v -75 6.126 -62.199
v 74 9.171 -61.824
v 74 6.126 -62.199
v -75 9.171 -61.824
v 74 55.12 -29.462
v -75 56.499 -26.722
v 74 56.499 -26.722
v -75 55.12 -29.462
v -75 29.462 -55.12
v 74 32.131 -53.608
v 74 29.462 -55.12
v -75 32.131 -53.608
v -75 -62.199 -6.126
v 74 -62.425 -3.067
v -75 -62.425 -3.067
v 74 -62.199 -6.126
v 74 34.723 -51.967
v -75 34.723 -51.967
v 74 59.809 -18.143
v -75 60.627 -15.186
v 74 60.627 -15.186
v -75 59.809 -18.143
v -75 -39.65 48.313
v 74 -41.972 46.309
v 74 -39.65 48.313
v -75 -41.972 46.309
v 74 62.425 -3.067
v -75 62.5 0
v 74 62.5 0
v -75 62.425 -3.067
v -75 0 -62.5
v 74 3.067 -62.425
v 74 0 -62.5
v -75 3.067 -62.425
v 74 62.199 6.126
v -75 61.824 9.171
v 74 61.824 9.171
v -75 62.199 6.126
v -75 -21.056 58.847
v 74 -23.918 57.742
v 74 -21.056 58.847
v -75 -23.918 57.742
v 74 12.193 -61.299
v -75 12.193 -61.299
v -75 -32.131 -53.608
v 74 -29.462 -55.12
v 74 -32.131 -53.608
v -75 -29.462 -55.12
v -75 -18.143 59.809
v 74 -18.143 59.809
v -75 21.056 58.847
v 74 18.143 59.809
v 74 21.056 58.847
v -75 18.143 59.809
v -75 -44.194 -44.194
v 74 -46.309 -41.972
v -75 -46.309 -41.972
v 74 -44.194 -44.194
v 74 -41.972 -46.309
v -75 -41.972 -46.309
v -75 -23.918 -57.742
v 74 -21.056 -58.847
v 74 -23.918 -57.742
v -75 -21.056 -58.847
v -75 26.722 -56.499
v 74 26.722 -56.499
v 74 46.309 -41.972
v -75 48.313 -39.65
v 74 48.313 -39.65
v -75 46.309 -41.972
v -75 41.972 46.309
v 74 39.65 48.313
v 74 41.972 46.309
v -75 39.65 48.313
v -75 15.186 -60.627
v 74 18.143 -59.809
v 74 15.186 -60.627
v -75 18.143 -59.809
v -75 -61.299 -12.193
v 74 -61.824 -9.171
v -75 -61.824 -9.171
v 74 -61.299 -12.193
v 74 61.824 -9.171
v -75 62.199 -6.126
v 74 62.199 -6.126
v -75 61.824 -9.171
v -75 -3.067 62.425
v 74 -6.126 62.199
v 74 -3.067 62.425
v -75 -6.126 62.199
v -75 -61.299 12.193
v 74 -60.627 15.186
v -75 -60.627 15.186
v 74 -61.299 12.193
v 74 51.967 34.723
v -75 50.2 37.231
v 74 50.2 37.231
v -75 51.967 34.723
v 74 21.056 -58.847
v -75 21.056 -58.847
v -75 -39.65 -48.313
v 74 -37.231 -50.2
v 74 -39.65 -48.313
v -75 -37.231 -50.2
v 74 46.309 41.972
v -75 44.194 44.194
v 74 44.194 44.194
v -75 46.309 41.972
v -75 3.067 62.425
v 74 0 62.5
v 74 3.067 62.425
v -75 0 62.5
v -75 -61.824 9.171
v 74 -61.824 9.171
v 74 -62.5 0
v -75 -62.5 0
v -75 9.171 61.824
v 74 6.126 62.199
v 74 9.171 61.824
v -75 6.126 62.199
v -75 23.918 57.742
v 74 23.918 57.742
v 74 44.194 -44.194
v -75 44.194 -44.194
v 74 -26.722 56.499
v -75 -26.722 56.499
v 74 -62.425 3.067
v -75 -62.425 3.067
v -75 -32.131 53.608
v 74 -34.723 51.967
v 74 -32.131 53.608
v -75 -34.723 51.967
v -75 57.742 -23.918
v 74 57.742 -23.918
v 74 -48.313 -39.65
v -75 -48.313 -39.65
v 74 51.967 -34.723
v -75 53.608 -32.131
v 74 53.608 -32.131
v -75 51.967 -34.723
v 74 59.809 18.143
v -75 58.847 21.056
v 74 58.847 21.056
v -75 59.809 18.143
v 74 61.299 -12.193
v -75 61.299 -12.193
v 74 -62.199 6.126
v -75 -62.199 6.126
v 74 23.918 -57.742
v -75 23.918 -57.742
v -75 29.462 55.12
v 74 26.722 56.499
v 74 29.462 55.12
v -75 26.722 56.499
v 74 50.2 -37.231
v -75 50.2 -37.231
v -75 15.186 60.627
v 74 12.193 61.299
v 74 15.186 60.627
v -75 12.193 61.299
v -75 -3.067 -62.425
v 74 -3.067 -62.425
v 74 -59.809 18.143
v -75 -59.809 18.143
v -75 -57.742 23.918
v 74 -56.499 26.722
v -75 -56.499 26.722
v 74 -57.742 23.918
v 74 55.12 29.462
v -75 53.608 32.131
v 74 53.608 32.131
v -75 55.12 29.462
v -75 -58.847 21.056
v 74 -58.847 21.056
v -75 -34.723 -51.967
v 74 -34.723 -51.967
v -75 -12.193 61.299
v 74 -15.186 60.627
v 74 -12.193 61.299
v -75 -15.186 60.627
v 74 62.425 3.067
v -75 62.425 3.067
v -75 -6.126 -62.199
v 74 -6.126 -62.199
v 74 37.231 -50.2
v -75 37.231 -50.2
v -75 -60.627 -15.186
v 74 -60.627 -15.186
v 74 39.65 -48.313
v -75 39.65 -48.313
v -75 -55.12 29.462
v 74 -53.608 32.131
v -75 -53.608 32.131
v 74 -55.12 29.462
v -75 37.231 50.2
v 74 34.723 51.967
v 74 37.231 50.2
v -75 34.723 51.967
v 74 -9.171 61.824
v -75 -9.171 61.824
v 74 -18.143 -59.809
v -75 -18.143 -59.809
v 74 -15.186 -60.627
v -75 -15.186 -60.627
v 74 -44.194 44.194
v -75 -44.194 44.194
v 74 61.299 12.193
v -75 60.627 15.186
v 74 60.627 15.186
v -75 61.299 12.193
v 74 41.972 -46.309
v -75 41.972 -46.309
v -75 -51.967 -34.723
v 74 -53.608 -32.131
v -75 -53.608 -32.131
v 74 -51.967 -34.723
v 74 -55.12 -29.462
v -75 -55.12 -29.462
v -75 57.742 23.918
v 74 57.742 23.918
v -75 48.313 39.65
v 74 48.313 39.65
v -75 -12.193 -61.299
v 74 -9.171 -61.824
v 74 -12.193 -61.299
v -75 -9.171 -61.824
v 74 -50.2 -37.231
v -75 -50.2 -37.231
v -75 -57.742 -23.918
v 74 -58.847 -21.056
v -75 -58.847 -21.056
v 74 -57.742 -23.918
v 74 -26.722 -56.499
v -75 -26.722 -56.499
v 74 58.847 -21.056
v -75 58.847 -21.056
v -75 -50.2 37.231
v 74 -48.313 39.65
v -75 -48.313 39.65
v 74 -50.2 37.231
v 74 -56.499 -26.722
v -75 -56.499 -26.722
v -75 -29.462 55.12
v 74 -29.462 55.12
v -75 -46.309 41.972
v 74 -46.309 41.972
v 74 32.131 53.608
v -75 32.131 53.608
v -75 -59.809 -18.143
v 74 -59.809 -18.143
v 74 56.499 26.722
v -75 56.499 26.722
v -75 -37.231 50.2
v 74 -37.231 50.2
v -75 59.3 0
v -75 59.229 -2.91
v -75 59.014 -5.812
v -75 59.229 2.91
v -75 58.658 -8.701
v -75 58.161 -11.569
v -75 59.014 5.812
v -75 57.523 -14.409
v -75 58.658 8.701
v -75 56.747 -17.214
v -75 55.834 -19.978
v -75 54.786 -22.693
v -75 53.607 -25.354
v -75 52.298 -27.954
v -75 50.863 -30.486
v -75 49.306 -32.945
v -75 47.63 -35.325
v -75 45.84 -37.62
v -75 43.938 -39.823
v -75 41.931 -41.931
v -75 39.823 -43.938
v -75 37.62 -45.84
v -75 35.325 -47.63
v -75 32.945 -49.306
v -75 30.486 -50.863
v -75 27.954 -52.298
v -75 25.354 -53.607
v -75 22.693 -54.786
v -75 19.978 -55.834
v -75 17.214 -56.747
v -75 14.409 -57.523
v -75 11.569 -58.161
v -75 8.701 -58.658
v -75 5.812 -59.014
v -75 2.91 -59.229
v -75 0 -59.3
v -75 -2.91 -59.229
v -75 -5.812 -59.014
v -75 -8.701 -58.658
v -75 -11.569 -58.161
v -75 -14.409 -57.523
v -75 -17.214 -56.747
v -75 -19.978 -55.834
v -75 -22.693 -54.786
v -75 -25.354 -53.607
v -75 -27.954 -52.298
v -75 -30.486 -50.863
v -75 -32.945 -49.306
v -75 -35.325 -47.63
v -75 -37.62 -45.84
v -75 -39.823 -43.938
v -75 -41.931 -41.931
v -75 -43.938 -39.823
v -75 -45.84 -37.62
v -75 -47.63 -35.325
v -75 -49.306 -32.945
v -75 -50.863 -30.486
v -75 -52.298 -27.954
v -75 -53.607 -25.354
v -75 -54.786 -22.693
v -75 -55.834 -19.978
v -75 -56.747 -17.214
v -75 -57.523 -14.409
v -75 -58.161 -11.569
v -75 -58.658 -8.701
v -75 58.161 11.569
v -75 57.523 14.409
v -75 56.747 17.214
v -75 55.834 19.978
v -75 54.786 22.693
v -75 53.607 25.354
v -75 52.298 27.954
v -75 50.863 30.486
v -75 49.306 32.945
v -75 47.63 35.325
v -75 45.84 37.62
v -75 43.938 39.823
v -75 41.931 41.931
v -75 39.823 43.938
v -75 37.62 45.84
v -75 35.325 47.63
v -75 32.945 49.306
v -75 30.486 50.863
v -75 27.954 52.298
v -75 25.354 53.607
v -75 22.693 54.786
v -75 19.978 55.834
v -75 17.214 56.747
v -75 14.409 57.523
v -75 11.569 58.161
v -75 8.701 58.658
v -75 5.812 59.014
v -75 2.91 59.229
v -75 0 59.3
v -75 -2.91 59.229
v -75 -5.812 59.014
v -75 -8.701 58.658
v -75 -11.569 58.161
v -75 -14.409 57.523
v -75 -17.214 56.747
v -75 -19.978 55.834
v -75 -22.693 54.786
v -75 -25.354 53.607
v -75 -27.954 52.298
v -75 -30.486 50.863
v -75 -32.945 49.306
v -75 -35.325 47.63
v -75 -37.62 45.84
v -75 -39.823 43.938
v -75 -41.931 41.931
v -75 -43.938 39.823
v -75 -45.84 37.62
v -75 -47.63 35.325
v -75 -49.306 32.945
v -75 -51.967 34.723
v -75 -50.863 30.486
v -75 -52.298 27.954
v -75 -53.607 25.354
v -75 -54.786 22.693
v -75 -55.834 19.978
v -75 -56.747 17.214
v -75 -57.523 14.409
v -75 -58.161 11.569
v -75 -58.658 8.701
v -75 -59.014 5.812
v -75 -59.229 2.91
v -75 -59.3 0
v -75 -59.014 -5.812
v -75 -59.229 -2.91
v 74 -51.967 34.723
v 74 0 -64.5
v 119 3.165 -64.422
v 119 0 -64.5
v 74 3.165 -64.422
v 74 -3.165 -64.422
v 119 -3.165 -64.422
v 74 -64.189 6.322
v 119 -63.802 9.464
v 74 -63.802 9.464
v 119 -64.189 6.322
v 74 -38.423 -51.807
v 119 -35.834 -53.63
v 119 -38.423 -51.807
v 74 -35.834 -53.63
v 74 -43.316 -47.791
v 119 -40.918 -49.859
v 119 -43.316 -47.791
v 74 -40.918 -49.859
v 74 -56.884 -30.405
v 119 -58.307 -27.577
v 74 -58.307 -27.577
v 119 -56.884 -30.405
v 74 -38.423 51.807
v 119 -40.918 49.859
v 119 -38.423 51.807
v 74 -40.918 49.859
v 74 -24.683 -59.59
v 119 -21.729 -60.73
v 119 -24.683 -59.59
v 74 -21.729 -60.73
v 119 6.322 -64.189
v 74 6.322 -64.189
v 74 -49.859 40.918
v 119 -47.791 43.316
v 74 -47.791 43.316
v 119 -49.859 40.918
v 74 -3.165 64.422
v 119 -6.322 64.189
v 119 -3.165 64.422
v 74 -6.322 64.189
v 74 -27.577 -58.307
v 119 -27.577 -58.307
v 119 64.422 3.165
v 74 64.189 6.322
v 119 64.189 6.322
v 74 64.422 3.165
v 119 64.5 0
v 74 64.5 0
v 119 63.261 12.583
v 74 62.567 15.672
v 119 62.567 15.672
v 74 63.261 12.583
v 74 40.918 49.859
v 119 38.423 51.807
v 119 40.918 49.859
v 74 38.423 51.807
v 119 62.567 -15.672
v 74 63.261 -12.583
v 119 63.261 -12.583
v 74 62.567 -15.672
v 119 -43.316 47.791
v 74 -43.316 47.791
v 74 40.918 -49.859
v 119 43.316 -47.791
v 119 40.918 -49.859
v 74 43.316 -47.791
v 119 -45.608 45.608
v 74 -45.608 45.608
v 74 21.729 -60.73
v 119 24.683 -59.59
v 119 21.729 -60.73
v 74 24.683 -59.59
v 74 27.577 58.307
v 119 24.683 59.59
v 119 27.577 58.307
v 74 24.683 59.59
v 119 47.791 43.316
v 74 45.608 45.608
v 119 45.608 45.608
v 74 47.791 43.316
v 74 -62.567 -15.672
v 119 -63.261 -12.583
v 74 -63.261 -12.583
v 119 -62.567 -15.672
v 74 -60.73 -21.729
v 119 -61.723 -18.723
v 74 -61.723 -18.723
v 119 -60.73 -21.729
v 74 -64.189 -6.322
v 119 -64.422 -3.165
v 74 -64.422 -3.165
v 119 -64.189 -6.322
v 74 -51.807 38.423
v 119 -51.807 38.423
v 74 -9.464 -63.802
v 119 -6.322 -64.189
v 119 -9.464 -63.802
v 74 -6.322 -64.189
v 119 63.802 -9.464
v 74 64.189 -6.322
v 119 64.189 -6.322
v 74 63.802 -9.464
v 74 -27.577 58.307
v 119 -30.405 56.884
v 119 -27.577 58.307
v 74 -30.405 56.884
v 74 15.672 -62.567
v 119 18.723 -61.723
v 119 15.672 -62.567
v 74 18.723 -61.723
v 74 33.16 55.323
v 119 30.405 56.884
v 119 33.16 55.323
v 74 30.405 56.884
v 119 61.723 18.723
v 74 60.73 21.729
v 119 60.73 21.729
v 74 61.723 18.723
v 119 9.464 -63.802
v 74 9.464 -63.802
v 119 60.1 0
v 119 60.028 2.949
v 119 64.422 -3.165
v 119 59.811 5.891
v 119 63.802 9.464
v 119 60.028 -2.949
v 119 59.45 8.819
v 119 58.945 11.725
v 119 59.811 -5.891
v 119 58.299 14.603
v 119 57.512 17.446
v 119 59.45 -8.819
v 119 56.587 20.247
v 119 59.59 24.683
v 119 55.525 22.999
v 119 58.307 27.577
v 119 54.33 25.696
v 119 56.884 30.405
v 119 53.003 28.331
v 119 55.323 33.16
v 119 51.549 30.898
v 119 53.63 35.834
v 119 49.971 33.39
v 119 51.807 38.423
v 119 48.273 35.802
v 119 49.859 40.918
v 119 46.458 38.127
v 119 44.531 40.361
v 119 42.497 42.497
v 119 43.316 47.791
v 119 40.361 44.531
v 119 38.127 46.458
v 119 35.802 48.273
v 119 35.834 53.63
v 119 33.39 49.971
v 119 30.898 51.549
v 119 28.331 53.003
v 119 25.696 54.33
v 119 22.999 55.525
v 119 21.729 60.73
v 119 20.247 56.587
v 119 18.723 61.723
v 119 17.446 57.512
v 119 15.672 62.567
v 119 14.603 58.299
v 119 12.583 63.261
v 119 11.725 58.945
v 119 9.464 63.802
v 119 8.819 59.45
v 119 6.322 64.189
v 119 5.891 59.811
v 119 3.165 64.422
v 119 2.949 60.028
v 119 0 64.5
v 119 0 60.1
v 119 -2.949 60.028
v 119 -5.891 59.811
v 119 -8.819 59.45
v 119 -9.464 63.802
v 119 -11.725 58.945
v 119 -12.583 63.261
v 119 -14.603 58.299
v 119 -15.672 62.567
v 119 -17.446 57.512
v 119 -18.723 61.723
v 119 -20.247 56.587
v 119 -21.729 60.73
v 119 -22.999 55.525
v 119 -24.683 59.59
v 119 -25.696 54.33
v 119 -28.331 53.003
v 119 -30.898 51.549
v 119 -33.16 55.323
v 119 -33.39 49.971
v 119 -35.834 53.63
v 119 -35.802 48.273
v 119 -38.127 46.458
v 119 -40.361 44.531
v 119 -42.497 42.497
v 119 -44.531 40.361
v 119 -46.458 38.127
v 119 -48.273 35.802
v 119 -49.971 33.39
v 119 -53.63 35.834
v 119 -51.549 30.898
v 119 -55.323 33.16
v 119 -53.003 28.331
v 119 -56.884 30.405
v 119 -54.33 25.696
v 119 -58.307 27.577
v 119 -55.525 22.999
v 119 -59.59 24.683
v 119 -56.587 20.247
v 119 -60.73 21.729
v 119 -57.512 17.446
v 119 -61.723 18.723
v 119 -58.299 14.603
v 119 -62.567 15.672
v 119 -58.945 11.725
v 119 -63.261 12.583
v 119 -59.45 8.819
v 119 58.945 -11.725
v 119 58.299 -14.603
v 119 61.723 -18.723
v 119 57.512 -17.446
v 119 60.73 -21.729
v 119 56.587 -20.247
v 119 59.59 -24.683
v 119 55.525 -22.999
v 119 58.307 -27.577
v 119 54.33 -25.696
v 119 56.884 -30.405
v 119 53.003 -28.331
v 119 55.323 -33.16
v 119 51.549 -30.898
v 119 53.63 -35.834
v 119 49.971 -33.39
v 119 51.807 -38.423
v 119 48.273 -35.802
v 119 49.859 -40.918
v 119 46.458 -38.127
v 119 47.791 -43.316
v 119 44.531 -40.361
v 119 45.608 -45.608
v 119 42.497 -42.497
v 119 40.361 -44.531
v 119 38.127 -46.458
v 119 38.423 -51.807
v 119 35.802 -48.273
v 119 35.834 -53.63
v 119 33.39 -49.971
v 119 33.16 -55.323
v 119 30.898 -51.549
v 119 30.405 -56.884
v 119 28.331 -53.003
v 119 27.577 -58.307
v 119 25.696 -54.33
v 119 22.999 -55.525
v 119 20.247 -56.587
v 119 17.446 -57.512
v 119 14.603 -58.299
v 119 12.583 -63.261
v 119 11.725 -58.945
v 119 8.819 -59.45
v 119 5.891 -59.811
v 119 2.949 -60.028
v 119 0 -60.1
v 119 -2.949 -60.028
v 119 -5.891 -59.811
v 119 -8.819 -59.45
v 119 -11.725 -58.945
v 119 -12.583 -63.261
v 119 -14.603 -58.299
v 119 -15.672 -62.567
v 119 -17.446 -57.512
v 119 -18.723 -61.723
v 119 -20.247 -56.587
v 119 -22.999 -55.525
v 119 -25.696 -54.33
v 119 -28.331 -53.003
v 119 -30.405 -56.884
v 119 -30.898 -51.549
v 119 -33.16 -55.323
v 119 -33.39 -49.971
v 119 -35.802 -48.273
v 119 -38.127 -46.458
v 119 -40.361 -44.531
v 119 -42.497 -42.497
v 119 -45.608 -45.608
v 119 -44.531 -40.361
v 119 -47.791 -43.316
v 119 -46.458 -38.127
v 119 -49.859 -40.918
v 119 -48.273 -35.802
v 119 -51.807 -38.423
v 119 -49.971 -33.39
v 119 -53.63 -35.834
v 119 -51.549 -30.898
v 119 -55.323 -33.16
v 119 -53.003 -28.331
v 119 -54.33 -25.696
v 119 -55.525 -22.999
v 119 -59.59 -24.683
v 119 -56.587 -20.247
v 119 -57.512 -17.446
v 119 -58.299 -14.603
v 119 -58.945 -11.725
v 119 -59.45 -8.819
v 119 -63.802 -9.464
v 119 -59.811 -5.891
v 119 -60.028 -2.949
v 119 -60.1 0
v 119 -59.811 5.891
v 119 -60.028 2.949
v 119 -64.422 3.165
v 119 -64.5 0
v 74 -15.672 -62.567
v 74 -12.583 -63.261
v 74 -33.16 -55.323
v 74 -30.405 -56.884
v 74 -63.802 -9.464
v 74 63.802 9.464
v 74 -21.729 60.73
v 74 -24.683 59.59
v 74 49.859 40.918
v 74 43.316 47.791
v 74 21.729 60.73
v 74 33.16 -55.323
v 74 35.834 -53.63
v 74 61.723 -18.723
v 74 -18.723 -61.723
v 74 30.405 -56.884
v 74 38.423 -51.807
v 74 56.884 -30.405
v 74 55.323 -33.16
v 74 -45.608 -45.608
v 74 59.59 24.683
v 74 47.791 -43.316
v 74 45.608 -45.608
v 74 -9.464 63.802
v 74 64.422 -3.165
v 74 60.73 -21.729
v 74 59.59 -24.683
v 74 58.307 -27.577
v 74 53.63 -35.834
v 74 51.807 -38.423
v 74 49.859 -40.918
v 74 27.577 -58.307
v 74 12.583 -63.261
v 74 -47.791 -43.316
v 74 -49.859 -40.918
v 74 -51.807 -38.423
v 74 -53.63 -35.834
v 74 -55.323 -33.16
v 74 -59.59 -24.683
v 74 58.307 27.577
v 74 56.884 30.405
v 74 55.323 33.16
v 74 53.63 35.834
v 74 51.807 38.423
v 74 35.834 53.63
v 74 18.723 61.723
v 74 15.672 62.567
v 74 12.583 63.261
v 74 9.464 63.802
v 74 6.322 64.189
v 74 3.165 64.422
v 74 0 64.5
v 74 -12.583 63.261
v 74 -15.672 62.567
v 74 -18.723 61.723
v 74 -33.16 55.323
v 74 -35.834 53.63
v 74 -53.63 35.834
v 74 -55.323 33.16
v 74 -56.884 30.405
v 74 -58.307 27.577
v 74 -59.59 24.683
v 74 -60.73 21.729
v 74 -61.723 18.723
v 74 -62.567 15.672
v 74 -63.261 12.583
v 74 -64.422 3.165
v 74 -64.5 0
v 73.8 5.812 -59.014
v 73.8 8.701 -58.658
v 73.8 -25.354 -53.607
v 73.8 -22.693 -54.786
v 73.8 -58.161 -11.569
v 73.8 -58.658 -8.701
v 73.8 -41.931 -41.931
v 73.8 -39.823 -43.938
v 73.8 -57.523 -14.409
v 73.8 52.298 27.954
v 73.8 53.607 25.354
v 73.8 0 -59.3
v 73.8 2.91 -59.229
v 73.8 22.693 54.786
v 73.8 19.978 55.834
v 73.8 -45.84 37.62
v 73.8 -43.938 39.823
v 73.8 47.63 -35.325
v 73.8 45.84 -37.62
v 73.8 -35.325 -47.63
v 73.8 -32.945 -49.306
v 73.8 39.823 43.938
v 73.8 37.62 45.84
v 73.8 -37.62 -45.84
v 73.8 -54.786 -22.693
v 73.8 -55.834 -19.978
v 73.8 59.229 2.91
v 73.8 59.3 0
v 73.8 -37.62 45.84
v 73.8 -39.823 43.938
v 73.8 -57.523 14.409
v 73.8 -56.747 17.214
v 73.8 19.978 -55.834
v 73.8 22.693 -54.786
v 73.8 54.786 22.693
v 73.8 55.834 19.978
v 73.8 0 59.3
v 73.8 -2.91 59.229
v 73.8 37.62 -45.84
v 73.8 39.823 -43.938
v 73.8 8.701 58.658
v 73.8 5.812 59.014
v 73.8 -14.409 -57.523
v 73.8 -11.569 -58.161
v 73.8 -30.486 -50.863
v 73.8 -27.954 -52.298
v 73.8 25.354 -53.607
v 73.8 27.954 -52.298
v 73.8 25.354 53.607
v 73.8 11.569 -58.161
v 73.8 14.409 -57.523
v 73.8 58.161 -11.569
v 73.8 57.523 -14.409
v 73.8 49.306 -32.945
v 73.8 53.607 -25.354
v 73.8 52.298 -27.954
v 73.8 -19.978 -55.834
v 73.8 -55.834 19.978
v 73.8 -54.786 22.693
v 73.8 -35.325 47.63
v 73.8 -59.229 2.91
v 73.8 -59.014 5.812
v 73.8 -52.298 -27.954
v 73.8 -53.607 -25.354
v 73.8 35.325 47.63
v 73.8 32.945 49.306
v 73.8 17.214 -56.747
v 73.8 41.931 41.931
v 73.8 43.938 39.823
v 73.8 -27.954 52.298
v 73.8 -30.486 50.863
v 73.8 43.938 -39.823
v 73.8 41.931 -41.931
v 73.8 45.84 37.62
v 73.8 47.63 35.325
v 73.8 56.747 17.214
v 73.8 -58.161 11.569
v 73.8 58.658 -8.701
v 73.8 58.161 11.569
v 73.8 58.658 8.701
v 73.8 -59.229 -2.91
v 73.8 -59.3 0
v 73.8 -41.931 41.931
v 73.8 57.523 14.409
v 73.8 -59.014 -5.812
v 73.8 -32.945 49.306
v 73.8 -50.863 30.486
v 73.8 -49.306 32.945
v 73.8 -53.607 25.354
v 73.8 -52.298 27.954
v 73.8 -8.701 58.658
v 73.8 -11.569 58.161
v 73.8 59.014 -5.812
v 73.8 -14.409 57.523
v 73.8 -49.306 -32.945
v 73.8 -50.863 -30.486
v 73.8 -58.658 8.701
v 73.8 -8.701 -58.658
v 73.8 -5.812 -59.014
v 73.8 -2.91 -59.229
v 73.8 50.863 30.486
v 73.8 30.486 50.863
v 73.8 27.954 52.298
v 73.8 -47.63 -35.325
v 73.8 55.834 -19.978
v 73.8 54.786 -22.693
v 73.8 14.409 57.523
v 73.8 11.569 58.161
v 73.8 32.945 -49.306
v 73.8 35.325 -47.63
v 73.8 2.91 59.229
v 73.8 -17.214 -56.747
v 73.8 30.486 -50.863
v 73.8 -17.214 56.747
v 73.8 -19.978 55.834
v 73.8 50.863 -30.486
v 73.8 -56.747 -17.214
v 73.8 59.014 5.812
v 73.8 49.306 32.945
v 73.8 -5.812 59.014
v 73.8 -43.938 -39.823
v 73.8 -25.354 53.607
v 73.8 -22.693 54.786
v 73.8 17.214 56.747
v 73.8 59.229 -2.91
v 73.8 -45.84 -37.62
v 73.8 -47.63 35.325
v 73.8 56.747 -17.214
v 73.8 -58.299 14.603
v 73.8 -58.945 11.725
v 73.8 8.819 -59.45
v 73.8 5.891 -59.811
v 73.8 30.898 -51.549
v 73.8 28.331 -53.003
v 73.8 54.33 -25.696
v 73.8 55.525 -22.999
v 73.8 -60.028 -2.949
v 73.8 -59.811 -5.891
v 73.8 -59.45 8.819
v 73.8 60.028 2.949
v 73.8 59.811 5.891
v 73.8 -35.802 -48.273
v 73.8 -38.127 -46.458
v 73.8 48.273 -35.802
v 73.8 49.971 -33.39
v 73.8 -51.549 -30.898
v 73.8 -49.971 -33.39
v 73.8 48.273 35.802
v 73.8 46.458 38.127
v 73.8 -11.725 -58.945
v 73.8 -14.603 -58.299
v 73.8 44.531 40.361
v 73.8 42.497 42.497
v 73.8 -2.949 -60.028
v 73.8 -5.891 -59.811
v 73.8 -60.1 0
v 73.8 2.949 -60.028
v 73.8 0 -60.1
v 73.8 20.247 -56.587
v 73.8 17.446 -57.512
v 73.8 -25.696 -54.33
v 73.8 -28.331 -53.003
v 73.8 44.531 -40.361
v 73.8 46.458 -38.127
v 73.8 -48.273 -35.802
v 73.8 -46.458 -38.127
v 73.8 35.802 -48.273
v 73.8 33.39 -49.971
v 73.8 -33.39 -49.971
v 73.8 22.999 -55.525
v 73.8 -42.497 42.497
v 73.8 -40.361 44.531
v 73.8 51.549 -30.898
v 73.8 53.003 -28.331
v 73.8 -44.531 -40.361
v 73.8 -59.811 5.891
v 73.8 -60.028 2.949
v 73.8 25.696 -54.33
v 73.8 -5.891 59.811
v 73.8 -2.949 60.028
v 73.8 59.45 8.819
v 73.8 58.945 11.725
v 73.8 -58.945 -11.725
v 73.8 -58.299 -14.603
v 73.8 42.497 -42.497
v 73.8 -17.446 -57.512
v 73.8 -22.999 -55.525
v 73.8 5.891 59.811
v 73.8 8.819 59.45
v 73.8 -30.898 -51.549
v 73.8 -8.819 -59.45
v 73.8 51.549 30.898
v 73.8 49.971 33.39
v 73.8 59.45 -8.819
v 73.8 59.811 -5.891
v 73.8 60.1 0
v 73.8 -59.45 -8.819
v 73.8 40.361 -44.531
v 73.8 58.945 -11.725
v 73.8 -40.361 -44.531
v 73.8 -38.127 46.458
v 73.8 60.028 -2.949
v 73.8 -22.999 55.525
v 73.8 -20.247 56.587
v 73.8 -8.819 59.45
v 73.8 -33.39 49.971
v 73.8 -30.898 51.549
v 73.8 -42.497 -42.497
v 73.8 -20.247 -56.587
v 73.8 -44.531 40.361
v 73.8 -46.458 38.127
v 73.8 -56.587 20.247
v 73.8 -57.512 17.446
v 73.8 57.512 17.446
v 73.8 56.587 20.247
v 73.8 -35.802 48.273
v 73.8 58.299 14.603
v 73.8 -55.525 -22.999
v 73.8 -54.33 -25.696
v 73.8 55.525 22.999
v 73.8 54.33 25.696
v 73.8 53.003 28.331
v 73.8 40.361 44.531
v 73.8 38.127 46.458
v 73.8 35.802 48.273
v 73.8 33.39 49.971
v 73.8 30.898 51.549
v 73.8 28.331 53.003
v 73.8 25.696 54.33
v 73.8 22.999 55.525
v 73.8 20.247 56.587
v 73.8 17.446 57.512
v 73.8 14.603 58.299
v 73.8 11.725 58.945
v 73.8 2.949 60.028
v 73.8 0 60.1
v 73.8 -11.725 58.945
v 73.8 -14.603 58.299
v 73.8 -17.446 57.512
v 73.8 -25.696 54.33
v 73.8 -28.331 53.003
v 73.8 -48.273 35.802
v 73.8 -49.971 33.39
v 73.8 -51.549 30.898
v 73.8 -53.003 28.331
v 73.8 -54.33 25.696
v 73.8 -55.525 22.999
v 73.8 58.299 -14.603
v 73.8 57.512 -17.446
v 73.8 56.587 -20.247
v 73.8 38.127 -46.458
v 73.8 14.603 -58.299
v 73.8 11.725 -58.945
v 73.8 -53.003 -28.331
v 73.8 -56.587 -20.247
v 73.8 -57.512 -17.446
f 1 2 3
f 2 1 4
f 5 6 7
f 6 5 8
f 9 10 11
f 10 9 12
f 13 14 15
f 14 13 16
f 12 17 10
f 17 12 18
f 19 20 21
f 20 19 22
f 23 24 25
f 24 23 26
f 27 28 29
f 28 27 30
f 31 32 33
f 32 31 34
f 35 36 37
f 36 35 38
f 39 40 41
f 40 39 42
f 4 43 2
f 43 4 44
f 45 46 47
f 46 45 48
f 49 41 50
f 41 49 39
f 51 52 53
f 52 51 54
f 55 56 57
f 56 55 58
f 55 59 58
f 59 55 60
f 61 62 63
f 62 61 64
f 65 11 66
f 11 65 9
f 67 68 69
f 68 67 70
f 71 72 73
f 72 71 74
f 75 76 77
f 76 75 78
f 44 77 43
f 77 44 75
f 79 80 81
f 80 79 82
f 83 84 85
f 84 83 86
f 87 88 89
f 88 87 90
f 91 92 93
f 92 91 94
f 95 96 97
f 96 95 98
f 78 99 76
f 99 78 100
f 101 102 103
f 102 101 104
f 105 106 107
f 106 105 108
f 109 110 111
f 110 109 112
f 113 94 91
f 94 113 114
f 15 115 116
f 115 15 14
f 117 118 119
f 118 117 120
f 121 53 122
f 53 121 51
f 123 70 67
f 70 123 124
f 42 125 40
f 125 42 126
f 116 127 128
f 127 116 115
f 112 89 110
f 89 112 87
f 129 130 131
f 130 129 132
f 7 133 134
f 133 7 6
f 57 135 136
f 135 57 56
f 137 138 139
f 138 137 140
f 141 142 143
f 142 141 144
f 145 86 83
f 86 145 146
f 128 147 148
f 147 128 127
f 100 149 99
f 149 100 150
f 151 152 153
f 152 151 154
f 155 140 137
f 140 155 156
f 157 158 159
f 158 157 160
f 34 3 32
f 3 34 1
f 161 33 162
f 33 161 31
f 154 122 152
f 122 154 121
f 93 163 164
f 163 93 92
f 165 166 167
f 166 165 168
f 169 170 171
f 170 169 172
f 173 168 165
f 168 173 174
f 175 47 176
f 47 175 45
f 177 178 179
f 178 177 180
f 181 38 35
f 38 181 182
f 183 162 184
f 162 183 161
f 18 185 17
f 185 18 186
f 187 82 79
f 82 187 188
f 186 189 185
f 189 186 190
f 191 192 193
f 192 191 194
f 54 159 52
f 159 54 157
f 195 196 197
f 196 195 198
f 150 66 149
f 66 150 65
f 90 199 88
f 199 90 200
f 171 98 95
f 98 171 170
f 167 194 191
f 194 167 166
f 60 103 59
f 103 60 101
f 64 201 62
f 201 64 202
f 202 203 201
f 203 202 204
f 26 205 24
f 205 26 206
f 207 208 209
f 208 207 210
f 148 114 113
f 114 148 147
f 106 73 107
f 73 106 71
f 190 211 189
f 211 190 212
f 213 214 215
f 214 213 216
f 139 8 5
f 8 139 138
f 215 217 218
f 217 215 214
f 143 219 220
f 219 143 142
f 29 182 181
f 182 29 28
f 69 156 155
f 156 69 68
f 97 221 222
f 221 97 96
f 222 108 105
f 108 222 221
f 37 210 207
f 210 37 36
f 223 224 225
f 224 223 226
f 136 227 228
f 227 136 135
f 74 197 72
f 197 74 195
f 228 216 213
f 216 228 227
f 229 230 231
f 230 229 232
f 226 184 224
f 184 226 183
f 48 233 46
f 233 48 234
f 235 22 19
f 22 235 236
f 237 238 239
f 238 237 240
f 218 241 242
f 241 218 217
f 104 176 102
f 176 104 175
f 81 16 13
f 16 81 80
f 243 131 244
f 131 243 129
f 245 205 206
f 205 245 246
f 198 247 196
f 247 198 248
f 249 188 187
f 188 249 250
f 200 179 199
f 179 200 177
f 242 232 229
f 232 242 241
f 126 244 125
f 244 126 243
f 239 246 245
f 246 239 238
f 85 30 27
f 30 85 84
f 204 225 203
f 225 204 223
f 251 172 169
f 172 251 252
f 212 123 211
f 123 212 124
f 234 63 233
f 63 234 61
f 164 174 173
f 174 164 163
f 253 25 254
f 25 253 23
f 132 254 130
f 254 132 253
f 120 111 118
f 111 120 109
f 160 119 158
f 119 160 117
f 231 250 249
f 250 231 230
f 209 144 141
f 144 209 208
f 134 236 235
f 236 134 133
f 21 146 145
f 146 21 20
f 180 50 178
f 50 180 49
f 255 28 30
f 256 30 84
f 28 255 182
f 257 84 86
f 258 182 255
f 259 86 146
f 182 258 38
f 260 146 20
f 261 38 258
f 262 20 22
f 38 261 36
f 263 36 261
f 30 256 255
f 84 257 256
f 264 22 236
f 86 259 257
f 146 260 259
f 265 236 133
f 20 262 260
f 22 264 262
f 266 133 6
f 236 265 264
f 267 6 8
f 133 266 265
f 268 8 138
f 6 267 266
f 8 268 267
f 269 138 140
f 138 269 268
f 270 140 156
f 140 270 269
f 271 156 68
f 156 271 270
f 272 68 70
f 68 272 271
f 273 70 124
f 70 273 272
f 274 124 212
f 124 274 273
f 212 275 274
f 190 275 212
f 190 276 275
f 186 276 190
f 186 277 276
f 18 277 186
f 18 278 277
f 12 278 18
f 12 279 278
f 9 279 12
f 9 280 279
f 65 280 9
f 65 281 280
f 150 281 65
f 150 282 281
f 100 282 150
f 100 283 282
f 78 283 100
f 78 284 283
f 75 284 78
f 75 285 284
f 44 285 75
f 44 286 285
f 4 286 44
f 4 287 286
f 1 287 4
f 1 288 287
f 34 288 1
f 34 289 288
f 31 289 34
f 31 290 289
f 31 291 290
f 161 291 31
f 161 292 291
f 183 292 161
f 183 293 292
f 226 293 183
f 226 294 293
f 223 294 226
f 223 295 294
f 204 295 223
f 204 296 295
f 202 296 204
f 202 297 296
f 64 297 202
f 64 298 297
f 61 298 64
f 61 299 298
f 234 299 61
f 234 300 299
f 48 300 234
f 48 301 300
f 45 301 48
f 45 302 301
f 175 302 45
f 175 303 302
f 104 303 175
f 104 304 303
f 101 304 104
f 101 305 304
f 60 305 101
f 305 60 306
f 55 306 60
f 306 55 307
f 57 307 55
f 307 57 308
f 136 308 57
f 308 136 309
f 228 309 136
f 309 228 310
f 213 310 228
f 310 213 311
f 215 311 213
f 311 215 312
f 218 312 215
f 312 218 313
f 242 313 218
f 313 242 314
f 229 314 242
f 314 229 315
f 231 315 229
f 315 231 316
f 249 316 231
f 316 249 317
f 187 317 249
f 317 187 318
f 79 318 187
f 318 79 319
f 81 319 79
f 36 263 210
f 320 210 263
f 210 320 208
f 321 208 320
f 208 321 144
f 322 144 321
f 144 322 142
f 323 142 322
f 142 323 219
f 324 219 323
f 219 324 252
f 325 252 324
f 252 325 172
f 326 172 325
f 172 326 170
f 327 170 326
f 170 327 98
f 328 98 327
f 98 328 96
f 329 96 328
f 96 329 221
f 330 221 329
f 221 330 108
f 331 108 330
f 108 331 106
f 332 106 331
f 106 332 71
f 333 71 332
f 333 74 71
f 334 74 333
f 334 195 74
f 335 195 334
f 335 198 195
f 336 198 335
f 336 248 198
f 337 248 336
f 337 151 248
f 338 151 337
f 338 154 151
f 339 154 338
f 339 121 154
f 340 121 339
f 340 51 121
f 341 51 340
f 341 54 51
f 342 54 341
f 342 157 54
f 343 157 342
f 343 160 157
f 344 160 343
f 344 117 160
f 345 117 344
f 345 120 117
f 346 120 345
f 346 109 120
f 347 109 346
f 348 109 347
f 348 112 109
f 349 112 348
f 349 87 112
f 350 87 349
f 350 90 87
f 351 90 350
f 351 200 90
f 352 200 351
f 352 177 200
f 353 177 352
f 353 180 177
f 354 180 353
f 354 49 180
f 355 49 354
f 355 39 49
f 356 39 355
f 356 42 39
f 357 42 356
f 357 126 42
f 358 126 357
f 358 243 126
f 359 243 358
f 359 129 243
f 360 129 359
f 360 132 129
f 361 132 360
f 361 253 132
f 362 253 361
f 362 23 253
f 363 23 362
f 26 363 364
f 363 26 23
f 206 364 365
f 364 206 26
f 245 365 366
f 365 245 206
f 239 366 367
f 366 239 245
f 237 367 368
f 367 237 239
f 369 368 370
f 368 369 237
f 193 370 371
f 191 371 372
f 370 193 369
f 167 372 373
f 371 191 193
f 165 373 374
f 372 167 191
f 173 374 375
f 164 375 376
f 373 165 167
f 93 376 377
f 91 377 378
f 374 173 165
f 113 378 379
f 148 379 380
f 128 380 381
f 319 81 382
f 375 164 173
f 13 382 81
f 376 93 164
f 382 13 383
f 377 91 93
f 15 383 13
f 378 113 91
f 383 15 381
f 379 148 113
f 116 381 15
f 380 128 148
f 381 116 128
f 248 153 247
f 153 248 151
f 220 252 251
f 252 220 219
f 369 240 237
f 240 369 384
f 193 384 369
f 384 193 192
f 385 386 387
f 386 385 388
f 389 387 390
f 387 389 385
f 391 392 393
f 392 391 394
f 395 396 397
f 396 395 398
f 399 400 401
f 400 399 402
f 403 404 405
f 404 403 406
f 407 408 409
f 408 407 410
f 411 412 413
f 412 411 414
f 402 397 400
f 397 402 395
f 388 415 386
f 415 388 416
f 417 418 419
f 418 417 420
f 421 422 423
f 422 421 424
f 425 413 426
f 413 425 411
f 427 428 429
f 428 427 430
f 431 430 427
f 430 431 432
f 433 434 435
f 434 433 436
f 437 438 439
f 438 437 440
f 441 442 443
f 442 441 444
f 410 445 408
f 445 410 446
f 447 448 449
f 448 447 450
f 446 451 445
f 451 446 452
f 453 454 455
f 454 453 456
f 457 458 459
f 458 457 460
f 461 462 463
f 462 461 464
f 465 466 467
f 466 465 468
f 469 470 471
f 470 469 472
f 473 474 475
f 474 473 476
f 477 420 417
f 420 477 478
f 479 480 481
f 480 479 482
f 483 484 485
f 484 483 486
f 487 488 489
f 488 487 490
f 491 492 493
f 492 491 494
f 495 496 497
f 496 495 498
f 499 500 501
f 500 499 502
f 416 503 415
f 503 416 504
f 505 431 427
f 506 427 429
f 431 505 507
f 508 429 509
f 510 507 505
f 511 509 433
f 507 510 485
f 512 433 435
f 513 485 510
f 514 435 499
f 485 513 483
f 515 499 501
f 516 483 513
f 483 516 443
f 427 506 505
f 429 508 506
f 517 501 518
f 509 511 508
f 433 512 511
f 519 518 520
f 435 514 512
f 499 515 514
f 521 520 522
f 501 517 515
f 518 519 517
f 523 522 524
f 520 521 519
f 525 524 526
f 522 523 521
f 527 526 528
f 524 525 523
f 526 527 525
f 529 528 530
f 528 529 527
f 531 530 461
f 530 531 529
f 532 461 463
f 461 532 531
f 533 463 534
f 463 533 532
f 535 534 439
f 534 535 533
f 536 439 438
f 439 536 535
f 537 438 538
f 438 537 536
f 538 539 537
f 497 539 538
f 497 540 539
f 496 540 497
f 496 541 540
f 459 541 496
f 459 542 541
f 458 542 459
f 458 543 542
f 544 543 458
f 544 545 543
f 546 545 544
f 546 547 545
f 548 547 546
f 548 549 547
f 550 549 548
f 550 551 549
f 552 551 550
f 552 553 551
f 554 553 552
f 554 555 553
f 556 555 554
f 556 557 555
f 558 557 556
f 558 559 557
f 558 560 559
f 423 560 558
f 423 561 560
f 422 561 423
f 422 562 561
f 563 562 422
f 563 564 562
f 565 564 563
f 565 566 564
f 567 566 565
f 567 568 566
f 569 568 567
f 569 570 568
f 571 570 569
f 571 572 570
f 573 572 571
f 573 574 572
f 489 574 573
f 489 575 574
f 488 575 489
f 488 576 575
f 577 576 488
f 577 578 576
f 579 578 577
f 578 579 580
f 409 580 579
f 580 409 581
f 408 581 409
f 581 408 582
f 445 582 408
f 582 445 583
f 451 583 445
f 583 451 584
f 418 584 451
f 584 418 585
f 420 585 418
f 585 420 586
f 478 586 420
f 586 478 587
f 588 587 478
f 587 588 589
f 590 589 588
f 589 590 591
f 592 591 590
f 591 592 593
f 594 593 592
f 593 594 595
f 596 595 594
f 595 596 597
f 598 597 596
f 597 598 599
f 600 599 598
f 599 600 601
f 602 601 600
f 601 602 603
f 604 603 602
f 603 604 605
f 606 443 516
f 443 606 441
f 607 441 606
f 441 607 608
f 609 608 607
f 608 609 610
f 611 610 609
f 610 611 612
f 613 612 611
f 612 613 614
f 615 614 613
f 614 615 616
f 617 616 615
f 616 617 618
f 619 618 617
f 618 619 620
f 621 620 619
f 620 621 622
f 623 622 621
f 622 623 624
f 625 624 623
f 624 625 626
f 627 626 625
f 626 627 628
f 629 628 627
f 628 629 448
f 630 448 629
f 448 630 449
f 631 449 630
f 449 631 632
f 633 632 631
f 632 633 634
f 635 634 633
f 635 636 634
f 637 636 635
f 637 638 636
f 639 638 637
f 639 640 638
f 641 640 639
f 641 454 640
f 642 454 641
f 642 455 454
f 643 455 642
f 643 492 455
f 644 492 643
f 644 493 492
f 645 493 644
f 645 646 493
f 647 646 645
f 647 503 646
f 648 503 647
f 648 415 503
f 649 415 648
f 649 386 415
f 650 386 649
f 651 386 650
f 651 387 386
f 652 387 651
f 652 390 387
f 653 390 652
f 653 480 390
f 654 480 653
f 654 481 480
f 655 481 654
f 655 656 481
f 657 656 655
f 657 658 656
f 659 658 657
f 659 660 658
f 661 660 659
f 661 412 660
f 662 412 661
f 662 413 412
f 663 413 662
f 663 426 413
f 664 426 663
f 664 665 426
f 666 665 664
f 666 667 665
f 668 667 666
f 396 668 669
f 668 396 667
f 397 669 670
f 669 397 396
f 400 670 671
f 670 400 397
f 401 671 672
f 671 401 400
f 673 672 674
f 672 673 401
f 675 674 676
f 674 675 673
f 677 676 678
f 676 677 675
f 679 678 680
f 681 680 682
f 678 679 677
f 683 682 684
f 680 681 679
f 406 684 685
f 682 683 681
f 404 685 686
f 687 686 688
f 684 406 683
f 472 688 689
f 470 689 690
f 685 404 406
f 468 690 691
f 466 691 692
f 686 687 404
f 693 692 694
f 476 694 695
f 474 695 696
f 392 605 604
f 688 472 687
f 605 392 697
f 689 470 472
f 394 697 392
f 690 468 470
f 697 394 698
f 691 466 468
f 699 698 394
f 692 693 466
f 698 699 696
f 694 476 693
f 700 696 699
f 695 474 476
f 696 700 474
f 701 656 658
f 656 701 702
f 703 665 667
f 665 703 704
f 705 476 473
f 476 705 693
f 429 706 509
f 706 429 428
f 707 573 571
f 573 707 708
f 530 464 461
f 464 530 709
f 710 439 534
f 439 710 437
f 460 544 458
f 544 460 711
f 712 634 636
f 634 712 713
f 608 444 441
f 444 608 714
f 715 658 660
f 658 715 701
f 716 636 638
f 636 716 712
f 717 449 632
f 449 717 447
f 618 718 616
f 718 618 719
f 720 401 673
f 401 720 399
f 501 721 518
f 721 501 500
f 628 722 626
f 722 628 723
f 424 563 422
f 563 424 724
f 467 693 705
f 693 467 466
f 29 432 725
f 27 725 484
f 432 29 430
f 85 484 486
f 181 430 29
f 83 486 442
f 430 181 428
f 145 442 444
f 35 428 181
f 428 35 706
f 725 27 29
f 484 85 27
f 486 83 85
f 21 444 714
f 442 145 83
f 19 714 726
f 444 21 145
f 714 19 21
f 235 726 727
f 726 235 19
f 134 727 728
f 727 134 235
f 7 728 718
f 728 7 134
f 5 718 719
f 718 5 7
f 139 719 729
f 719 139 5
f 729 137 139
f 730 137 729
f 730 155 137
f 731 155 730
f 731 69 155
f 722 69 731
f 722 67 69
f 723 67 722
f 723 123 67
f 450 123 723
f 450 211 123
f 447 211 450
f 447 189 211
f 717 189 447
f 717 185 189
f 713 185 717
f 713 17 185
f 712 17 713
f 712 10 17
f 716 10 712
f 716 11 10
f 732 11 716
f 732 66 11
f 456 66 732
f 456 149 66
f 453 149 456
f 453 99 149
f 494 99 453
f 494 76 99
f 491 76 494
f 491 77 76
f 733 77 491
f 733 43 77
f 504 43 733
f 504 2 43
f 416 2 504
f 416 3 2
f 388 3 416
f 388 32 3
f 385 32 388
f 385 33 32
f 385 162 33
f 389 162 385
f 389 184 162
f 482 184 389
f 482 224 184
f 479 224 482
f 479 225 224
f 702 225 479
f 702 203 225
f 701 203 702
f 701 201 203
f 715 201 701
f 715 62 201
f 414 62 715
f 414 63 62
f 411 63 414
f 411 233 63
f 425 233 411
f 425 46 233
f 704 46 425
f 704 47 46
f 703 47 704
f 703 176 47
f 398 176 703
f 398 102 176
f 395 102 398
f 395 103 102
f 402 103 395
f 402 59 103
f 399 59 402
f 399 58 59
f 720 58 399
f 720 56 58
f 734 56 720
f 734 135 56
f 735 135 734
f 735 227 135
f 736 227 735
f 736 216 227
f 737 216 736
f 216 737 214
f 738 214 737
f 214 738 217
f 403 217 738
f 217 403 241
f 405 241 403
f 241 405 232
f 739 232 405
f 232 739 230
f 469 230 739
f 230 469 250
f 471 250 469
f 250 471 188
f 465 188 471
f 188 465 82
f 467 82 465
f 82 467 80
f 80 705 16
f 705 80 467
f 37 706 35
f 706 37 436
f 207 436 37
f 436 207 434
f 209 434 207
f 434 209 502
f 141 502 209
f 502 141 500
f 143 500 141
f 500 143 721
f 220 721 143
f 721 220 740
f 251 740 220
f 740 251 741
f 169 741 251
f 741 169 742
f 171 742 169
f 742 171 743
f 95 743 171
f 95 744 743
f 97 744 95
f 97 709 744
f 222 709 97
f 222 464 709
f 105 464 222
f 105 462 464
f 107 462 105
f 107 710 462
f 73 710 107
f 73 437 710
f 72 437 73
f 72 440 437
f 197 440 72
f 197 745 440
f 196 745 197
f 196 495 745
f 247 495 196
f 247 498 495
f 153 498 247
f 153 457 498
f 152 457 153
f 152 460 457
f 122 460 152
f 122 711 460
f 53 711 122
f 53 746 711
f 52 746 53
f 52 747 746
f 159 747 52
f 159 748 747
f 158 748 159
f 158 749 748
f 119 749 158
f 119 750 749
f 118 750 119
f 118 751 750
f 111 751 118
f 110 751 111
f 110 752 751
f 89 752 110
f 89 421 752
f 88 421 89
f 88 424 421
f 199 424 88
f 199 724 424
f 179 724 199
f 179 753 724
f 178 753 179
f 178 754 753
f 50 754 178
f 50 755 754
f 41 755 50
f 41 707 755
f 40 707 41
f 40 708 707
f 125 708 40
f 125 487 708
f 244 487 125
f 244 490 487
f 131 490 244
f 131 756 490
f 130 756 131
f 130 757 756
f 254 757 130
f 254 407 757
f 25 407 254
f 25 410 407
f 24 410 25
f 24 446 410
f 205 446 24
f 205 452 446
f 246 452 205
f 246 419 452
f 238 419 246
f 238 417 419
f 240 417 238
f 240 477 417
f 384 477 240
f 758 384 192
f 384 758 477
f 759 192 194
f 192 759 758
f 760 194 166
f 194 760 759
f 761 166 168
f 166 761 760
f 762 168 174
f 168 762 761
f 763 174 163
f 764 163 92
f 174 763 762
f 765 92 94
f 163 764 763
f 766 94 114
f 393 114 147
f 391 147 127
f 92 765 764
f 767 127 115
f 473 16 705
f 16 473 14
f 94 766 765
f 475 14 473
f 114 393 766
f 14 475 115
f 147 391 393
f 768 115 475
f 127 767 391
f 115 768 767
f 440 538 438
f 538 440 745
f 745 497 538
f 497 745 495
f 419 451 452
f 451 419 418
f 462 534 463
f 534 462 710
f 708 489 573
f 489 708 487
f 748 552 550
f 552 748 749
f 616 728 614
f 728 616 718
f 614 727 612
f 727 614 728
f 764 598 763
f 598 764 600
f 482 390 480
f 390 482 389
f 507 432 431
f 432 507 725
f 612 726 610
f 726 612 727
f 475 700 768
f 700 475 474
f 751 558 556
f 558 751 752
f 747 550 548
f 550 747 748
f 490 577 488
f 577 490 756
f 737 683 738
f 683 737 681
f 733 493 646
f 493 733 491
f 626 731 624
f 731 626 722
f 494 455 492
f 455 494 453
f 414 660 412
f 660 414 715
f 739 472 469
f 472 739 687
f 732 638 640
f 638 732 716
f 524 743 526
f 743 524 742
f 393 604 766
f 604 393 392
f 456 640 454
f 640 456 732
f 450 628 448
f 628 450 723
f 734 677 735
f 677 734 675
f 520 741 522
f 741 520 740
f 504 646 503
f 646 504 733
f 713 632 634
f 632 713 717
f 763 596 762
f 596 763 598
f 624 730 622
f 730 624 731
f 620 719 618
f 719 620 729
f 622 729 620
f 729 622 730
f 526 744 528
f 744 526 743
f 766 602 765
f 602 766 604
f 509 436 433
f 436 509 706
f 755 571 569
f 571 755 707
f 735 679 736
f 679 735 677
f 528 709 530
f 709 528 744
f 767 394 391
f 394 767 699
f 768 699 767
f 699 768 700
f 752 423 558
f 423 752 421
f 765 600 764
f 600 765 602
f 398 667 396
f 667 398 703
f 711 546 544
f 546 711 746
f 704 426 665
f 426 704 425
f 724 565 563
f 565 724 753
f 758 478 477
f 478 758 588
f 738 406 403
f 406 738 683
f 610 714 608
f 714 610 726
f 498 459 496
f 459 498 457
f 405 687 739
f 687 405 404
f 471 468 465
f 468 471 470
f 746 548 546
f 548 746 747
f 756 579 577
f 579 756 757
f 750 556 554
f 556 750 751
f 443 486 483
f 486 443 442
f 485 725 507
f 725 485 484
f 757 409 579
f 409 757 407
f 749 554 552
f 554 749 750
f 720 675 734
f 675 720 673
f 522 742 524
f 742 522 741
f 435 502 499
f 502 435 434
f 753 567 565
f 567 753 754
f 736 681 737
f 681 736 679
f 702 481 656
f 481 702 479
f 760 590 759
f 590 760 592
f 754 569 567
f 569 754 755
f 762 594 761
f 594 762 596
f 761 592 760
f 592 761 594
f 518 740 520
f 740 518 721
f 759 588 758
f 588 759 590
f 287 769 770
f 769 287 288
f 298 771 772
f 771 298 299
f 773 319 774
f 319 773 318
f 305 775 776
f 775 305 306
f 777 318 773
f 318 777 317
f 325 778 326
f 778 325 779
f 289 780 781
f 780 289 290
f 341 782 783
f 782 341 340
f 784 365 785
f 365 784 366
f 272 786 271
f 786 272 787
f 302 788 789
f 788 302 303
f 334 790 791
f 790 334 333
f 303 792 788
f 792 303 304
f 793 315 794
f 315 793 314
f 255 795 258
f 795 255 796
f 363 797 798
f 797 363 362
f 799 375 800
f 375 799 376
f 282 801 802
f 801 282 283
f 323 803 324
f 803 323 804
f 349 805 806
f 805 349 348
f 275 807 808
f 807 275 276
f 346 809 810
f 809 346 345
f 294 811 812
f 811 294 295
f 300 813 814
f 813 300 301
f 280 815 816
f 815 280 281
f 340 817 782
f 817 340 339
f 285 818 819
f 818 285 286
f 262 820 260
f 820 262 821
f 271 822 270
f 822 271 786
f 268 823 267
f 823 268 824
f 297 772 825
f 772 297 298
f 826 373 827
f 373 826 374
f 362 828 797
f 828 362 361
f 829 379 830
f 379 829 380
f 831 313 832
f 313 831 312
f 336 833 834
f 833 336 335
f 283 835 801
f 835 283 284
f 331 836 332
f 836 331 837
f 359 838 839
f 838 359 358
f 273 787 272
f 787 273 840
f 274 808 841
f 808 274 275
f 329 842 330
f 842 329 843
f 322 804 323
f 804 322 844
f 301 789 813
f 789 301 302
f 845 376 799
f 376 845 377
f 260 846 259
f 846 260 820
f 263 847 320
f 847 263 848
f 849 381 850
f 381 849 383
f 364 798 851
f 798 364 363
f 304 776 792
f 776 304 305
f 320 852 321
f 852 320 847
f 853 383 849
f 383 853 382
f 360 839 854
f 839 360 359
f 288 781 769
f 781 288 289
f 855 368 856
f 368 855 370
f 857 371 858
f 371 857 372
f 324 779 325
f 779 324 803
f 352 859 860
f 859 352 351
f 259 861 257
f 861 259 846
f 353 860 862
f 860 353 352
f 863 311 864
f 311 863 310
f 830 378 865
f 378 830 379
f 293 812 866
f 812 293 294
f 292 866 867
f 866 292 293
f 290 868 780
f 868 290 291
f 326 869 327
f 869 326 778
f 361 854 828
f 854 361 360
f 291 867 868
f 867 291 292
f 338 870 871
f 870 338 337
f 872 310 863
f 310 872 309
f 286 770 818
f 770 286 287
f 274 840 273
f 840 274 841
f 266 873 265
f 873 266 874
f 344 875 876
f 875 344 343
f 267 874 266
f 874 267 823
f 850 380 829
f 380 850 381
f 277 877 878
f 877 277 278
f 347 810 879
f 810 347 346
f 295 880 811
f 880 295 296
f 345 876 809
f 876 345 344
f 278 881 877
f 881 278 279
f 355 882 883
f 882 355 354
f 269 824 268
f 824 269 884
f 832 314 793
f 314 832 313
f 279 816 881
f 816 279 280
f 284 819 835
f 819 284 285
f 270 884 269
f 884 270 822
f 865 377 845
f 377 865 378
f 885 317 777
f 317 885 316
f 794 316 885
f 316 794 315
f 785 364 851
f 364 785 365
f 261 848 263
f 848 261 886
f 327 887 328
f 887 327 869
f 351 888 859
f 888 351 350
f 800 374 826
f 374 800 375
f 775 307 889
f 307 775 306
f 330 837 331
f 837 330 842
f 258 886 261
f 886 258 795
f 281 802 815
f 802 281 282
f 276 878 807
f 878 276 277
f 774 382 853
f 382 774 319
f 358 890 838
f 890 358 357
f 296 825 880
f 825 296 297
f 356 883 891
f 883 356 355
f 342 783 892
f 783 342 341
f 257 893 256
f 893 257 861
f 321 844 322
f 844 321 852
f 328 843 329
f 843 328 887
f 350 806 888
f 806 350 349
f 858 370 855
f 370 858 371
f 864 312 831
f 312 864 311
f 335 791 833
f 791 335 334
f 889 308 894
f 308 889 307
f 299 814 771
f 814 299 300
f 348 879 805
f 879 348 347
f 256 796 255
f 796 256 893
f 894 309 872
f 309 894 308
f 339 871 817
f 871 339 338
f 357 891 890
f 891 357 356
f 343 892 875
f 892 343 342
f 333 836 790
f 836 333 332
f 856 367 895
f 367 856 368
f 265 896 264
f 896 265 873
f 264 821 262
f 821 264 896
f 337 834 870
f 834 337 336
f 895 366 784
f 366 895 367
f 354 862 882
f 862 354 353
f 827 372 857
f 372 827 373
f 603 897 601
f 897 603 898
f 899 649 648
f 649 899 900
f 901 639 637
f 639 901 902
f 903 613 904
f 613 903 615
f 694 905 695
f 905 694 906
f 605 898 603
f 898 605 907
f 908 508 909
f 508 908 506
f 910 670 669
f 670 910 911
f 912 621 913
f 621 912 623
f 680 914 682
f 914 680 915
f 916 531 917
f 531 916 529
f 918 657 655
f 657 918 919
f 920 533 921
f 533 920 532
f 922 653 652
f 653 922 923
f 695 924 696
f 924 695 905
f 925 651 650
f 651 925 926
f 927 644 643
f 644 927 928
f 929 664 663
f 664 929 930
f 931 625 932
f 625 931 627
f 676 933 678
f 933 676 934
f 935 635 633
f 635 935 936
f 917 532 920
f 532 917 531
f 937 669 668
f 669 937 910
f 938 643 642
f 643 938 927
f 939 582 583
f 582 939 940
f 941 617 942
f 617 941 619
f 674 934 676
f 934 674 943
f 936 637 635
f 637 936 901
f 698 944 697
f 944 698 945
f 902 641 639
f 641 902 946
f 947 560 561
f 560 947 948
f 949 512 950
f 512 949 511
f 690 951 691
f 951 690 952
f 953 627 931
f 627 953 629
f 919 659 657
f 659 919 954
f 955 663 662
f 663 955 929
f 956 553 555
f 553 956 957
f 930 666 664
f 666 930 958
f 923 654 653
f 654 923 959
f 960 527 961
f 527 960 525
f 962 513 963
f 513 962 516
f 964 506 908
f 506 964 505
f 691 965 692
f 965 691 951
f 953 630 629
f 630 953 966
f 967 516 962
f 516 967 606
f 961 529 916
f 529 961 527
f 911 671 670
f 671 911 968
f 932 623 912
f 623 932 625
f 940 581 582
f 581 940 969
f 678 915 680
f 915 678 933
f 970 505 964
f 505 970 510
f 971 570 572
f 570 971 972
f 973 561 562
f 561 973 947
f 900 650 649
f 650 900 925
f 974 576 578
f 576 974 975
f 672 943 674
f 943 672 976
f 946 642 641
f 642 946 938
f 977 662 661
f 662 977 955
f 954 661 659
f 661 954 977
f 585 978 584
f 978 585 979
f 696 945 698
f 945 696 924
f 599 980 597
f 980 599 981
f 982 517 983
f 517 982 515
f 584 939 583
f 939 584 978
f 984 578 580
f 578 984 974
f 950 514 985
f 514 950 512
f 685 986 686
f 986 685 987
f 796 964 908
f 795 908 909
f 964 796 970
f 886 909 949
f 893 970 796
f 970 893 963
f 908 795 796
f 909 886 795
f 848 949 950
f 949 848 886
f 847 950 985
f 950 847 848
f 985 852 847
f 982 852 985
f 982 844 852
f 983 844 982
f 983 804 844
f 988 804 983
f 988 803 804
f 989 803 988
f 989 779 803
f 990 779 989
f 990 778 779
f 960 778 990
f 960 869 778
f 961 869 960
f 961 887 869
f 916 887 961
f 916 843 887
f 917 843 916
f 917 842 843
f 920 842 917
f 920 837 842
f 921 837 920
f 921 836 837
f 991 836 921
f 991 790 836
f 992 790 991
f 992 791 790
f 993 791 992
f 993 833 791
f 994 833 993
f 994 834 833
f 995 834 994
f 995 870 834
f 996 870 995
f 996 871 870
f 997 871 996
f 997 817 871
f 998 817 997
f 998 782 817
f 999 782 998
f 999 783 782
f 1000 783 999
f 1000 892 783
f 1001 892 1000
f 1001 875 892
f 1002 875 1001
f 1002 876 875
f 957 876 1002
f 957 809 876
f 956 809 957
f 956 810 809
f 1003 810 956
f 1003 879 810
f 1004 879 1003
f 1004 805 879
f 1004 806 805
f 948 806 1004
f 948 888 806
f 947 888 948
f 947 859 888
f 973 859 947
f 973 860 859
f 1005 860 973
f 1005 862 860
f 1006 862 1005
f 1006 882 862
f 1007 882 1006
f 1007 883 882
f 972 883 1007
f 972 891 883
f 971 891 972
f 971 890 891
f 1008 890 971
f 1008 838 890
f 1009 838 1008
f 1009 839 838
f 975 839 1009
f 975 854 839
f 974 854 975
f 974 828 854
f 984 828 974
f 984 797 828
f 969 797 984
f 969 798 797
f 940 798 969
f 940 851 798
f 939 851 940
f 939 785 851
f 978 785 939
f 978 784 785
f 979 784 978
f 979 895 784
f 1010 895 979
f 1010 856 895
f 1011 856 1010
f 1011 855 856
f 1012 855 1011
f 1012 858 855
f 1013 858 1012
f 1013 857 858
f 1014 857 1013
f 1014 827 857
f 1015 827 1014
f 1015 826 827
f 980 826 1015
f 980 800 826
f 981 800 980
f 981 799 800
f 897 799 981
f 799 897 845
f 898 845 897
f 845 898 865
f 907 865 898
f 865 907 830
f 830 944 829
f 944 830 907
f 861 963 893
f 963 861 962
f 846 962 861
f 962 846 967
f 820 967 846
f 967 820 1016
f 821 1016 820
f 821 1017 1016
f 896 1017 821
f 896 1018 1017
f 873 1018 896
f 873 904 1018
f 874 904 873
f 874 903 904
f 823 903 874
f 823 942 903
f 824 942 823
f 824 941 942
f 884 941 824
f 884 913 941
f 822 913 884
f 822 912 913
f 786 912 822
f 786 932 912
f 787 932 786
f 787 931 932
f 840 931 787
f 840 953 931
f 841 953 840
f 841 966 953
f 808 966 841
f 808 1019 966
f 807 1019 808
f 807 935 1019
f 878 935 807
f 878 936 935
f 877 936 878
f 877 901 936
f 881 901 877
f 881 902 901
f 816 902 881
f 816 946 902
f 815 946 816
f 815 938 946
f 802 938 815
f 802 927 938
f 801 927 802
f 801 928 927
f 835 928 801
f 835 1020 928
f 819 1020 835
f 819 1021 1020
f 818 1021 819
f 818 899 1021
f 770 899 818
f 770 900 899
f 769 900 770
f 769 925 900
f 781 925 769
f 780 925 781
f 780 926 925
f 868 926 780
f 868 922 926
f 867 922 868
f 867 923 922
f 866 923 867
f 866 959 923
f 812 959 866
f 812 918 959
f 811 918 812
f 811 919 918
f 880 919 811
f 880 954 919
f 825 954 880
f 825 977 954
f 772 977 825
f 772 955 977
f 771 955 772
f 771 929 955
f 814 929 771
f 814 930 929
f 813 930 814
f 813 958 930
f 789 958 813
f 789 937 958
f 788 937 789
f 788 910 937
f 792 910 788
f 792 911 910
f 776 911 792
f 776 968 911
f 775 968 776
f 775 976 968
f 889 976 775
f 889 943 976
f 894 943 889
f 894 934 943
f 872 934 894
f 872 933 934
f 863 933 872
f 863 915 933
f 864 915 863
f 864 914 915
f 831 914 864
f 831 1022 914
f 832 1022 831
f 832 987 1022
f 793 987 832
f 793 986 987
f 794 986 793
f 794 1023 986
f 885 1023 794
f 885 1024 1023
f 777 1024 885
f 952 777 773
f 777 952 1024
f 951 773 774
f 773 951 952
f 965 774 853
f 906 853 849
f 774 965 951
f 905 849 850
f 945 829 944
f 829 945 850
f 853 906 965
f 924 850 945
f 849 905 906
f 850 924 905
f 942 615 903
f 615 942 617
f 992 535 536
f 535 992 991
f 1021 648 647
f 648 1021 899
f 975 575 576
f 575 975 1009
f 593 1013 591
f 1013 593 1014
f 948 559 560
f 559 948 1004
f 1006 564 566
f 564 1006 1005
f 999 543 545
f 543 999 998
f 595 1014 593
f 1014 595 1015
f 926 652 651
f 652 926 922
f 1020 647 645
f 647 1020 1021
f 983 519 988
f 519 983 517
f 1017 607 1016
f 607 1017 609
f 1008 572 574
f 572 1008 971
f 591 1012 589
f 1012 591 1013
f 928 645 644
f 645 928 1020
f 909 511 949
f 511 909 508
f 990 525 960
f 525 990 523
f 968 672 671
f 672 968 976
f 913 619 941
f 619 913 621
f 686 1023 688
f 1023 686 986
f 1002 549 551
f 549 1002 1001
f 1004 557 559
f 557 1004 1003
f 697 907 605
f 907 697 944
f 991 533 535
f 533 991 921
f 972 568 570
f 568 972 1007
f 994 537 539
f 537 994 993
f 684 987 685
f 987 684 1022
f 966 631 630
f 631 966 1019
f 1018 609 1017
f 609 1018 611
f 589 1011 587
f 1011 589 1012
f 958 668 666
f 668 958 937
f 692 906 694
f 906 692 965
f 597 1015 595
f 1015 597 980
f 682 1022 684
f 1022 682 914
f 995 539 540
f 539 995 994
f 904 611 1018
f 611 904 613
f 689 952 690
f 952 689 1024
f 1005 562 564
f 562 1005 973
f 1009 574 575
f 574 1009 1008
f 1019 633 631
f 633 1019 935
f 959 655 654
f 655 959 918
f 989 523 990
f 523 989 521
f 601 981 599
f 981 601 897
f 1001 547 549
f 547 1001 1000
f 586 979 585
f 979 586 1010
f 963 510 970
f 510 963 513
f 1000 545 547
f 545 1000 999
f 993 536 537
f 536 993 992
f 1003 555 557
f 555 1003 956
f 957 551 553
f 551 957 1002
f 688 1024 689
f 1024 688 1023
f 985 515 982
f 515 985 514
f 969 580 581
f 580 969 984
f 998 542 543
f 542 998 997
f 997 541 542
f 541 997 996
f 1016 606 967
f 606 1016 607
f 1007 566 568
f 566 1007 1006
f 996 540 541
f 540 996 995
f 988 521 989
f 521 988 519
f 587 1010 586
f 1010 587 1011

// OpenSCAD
$fn = 128;

// HT pipe parameters (HT 125, length 150 mm)
outer_d = 125;      // mm (spigot OD)
length  = 150;      // mm (overall length)
wall    = 3.2;      // mm

// Simple HT-style socket/bell end (typical visual feature)
socket_len = 45;    // mm
socket_wall_extra = 2.0; // mm added wall thickness at socket (visual)
lead_in = 2.0;      // mm small chamfer/lead-in at socket mouth

inner_d = outer_d - 2*wall;

// Derived
outer_r = outer_d/2;
inner_r = inner_d/2;

socket_outer_d = outer_d + 2*socket_wall_extra;
socket_outer_r = socket_outer_d/2;

// Place pipe axis along X
module x_cyl(h, d, center=true) {
    rotate([0, 90, 0]) cylinder(h=h, d=d, center=center);
}

difference() {
    // ONE connected solid: main pipe + socket (overlapping by overlap_x)
    union() {
        // Main outer body
        x_cyl(h=length, d=outer_d, center=true);

        // Socket/bell outer (connected at +X end)
        // Main spans X: [-length/2, +length/2]
        // Socket spans X: [length/2 - overlap_x, length/2 - overlap_x + socket_len]
        overlap_x = 1.0; // ensures union connectivity
        translate([length/2 - overlap_x + socket_len/2, 0, 0])
            x_cyl(h=socket_len, d=socket_outer_d, center=true);

        // Small lead-in ring at socket mouth (visual chamfer-like)
        // Positioned at the socket far end
        translate([length/2 - overlap_x + socket_len - lead_in/2, 0, 0])
            x_cyl(h=lead_in, d1=socket_outer_d, d2=socket_outer_d - 2*lead_in, center=true);
    }

    // Inner void through entire assembly (open ends)
    // Extend a bit to guarantee clean openings
    x_cyl(h=length + socket_len + 0.4, d=inner_d, center=true);

    // Slightly larger inner at socket region to suggest socket clearance
    // (still one connected solid; this is a subtraction)
    socket_clearance = 0.8; // mm radial clearance (visual)
    translate([length/2 - 1.0 + socket_len/2, 0, 0])
        x_cyl(h=socket_len + 0.4, d=inner_d + 2*socket_clearance, center=true);
}
